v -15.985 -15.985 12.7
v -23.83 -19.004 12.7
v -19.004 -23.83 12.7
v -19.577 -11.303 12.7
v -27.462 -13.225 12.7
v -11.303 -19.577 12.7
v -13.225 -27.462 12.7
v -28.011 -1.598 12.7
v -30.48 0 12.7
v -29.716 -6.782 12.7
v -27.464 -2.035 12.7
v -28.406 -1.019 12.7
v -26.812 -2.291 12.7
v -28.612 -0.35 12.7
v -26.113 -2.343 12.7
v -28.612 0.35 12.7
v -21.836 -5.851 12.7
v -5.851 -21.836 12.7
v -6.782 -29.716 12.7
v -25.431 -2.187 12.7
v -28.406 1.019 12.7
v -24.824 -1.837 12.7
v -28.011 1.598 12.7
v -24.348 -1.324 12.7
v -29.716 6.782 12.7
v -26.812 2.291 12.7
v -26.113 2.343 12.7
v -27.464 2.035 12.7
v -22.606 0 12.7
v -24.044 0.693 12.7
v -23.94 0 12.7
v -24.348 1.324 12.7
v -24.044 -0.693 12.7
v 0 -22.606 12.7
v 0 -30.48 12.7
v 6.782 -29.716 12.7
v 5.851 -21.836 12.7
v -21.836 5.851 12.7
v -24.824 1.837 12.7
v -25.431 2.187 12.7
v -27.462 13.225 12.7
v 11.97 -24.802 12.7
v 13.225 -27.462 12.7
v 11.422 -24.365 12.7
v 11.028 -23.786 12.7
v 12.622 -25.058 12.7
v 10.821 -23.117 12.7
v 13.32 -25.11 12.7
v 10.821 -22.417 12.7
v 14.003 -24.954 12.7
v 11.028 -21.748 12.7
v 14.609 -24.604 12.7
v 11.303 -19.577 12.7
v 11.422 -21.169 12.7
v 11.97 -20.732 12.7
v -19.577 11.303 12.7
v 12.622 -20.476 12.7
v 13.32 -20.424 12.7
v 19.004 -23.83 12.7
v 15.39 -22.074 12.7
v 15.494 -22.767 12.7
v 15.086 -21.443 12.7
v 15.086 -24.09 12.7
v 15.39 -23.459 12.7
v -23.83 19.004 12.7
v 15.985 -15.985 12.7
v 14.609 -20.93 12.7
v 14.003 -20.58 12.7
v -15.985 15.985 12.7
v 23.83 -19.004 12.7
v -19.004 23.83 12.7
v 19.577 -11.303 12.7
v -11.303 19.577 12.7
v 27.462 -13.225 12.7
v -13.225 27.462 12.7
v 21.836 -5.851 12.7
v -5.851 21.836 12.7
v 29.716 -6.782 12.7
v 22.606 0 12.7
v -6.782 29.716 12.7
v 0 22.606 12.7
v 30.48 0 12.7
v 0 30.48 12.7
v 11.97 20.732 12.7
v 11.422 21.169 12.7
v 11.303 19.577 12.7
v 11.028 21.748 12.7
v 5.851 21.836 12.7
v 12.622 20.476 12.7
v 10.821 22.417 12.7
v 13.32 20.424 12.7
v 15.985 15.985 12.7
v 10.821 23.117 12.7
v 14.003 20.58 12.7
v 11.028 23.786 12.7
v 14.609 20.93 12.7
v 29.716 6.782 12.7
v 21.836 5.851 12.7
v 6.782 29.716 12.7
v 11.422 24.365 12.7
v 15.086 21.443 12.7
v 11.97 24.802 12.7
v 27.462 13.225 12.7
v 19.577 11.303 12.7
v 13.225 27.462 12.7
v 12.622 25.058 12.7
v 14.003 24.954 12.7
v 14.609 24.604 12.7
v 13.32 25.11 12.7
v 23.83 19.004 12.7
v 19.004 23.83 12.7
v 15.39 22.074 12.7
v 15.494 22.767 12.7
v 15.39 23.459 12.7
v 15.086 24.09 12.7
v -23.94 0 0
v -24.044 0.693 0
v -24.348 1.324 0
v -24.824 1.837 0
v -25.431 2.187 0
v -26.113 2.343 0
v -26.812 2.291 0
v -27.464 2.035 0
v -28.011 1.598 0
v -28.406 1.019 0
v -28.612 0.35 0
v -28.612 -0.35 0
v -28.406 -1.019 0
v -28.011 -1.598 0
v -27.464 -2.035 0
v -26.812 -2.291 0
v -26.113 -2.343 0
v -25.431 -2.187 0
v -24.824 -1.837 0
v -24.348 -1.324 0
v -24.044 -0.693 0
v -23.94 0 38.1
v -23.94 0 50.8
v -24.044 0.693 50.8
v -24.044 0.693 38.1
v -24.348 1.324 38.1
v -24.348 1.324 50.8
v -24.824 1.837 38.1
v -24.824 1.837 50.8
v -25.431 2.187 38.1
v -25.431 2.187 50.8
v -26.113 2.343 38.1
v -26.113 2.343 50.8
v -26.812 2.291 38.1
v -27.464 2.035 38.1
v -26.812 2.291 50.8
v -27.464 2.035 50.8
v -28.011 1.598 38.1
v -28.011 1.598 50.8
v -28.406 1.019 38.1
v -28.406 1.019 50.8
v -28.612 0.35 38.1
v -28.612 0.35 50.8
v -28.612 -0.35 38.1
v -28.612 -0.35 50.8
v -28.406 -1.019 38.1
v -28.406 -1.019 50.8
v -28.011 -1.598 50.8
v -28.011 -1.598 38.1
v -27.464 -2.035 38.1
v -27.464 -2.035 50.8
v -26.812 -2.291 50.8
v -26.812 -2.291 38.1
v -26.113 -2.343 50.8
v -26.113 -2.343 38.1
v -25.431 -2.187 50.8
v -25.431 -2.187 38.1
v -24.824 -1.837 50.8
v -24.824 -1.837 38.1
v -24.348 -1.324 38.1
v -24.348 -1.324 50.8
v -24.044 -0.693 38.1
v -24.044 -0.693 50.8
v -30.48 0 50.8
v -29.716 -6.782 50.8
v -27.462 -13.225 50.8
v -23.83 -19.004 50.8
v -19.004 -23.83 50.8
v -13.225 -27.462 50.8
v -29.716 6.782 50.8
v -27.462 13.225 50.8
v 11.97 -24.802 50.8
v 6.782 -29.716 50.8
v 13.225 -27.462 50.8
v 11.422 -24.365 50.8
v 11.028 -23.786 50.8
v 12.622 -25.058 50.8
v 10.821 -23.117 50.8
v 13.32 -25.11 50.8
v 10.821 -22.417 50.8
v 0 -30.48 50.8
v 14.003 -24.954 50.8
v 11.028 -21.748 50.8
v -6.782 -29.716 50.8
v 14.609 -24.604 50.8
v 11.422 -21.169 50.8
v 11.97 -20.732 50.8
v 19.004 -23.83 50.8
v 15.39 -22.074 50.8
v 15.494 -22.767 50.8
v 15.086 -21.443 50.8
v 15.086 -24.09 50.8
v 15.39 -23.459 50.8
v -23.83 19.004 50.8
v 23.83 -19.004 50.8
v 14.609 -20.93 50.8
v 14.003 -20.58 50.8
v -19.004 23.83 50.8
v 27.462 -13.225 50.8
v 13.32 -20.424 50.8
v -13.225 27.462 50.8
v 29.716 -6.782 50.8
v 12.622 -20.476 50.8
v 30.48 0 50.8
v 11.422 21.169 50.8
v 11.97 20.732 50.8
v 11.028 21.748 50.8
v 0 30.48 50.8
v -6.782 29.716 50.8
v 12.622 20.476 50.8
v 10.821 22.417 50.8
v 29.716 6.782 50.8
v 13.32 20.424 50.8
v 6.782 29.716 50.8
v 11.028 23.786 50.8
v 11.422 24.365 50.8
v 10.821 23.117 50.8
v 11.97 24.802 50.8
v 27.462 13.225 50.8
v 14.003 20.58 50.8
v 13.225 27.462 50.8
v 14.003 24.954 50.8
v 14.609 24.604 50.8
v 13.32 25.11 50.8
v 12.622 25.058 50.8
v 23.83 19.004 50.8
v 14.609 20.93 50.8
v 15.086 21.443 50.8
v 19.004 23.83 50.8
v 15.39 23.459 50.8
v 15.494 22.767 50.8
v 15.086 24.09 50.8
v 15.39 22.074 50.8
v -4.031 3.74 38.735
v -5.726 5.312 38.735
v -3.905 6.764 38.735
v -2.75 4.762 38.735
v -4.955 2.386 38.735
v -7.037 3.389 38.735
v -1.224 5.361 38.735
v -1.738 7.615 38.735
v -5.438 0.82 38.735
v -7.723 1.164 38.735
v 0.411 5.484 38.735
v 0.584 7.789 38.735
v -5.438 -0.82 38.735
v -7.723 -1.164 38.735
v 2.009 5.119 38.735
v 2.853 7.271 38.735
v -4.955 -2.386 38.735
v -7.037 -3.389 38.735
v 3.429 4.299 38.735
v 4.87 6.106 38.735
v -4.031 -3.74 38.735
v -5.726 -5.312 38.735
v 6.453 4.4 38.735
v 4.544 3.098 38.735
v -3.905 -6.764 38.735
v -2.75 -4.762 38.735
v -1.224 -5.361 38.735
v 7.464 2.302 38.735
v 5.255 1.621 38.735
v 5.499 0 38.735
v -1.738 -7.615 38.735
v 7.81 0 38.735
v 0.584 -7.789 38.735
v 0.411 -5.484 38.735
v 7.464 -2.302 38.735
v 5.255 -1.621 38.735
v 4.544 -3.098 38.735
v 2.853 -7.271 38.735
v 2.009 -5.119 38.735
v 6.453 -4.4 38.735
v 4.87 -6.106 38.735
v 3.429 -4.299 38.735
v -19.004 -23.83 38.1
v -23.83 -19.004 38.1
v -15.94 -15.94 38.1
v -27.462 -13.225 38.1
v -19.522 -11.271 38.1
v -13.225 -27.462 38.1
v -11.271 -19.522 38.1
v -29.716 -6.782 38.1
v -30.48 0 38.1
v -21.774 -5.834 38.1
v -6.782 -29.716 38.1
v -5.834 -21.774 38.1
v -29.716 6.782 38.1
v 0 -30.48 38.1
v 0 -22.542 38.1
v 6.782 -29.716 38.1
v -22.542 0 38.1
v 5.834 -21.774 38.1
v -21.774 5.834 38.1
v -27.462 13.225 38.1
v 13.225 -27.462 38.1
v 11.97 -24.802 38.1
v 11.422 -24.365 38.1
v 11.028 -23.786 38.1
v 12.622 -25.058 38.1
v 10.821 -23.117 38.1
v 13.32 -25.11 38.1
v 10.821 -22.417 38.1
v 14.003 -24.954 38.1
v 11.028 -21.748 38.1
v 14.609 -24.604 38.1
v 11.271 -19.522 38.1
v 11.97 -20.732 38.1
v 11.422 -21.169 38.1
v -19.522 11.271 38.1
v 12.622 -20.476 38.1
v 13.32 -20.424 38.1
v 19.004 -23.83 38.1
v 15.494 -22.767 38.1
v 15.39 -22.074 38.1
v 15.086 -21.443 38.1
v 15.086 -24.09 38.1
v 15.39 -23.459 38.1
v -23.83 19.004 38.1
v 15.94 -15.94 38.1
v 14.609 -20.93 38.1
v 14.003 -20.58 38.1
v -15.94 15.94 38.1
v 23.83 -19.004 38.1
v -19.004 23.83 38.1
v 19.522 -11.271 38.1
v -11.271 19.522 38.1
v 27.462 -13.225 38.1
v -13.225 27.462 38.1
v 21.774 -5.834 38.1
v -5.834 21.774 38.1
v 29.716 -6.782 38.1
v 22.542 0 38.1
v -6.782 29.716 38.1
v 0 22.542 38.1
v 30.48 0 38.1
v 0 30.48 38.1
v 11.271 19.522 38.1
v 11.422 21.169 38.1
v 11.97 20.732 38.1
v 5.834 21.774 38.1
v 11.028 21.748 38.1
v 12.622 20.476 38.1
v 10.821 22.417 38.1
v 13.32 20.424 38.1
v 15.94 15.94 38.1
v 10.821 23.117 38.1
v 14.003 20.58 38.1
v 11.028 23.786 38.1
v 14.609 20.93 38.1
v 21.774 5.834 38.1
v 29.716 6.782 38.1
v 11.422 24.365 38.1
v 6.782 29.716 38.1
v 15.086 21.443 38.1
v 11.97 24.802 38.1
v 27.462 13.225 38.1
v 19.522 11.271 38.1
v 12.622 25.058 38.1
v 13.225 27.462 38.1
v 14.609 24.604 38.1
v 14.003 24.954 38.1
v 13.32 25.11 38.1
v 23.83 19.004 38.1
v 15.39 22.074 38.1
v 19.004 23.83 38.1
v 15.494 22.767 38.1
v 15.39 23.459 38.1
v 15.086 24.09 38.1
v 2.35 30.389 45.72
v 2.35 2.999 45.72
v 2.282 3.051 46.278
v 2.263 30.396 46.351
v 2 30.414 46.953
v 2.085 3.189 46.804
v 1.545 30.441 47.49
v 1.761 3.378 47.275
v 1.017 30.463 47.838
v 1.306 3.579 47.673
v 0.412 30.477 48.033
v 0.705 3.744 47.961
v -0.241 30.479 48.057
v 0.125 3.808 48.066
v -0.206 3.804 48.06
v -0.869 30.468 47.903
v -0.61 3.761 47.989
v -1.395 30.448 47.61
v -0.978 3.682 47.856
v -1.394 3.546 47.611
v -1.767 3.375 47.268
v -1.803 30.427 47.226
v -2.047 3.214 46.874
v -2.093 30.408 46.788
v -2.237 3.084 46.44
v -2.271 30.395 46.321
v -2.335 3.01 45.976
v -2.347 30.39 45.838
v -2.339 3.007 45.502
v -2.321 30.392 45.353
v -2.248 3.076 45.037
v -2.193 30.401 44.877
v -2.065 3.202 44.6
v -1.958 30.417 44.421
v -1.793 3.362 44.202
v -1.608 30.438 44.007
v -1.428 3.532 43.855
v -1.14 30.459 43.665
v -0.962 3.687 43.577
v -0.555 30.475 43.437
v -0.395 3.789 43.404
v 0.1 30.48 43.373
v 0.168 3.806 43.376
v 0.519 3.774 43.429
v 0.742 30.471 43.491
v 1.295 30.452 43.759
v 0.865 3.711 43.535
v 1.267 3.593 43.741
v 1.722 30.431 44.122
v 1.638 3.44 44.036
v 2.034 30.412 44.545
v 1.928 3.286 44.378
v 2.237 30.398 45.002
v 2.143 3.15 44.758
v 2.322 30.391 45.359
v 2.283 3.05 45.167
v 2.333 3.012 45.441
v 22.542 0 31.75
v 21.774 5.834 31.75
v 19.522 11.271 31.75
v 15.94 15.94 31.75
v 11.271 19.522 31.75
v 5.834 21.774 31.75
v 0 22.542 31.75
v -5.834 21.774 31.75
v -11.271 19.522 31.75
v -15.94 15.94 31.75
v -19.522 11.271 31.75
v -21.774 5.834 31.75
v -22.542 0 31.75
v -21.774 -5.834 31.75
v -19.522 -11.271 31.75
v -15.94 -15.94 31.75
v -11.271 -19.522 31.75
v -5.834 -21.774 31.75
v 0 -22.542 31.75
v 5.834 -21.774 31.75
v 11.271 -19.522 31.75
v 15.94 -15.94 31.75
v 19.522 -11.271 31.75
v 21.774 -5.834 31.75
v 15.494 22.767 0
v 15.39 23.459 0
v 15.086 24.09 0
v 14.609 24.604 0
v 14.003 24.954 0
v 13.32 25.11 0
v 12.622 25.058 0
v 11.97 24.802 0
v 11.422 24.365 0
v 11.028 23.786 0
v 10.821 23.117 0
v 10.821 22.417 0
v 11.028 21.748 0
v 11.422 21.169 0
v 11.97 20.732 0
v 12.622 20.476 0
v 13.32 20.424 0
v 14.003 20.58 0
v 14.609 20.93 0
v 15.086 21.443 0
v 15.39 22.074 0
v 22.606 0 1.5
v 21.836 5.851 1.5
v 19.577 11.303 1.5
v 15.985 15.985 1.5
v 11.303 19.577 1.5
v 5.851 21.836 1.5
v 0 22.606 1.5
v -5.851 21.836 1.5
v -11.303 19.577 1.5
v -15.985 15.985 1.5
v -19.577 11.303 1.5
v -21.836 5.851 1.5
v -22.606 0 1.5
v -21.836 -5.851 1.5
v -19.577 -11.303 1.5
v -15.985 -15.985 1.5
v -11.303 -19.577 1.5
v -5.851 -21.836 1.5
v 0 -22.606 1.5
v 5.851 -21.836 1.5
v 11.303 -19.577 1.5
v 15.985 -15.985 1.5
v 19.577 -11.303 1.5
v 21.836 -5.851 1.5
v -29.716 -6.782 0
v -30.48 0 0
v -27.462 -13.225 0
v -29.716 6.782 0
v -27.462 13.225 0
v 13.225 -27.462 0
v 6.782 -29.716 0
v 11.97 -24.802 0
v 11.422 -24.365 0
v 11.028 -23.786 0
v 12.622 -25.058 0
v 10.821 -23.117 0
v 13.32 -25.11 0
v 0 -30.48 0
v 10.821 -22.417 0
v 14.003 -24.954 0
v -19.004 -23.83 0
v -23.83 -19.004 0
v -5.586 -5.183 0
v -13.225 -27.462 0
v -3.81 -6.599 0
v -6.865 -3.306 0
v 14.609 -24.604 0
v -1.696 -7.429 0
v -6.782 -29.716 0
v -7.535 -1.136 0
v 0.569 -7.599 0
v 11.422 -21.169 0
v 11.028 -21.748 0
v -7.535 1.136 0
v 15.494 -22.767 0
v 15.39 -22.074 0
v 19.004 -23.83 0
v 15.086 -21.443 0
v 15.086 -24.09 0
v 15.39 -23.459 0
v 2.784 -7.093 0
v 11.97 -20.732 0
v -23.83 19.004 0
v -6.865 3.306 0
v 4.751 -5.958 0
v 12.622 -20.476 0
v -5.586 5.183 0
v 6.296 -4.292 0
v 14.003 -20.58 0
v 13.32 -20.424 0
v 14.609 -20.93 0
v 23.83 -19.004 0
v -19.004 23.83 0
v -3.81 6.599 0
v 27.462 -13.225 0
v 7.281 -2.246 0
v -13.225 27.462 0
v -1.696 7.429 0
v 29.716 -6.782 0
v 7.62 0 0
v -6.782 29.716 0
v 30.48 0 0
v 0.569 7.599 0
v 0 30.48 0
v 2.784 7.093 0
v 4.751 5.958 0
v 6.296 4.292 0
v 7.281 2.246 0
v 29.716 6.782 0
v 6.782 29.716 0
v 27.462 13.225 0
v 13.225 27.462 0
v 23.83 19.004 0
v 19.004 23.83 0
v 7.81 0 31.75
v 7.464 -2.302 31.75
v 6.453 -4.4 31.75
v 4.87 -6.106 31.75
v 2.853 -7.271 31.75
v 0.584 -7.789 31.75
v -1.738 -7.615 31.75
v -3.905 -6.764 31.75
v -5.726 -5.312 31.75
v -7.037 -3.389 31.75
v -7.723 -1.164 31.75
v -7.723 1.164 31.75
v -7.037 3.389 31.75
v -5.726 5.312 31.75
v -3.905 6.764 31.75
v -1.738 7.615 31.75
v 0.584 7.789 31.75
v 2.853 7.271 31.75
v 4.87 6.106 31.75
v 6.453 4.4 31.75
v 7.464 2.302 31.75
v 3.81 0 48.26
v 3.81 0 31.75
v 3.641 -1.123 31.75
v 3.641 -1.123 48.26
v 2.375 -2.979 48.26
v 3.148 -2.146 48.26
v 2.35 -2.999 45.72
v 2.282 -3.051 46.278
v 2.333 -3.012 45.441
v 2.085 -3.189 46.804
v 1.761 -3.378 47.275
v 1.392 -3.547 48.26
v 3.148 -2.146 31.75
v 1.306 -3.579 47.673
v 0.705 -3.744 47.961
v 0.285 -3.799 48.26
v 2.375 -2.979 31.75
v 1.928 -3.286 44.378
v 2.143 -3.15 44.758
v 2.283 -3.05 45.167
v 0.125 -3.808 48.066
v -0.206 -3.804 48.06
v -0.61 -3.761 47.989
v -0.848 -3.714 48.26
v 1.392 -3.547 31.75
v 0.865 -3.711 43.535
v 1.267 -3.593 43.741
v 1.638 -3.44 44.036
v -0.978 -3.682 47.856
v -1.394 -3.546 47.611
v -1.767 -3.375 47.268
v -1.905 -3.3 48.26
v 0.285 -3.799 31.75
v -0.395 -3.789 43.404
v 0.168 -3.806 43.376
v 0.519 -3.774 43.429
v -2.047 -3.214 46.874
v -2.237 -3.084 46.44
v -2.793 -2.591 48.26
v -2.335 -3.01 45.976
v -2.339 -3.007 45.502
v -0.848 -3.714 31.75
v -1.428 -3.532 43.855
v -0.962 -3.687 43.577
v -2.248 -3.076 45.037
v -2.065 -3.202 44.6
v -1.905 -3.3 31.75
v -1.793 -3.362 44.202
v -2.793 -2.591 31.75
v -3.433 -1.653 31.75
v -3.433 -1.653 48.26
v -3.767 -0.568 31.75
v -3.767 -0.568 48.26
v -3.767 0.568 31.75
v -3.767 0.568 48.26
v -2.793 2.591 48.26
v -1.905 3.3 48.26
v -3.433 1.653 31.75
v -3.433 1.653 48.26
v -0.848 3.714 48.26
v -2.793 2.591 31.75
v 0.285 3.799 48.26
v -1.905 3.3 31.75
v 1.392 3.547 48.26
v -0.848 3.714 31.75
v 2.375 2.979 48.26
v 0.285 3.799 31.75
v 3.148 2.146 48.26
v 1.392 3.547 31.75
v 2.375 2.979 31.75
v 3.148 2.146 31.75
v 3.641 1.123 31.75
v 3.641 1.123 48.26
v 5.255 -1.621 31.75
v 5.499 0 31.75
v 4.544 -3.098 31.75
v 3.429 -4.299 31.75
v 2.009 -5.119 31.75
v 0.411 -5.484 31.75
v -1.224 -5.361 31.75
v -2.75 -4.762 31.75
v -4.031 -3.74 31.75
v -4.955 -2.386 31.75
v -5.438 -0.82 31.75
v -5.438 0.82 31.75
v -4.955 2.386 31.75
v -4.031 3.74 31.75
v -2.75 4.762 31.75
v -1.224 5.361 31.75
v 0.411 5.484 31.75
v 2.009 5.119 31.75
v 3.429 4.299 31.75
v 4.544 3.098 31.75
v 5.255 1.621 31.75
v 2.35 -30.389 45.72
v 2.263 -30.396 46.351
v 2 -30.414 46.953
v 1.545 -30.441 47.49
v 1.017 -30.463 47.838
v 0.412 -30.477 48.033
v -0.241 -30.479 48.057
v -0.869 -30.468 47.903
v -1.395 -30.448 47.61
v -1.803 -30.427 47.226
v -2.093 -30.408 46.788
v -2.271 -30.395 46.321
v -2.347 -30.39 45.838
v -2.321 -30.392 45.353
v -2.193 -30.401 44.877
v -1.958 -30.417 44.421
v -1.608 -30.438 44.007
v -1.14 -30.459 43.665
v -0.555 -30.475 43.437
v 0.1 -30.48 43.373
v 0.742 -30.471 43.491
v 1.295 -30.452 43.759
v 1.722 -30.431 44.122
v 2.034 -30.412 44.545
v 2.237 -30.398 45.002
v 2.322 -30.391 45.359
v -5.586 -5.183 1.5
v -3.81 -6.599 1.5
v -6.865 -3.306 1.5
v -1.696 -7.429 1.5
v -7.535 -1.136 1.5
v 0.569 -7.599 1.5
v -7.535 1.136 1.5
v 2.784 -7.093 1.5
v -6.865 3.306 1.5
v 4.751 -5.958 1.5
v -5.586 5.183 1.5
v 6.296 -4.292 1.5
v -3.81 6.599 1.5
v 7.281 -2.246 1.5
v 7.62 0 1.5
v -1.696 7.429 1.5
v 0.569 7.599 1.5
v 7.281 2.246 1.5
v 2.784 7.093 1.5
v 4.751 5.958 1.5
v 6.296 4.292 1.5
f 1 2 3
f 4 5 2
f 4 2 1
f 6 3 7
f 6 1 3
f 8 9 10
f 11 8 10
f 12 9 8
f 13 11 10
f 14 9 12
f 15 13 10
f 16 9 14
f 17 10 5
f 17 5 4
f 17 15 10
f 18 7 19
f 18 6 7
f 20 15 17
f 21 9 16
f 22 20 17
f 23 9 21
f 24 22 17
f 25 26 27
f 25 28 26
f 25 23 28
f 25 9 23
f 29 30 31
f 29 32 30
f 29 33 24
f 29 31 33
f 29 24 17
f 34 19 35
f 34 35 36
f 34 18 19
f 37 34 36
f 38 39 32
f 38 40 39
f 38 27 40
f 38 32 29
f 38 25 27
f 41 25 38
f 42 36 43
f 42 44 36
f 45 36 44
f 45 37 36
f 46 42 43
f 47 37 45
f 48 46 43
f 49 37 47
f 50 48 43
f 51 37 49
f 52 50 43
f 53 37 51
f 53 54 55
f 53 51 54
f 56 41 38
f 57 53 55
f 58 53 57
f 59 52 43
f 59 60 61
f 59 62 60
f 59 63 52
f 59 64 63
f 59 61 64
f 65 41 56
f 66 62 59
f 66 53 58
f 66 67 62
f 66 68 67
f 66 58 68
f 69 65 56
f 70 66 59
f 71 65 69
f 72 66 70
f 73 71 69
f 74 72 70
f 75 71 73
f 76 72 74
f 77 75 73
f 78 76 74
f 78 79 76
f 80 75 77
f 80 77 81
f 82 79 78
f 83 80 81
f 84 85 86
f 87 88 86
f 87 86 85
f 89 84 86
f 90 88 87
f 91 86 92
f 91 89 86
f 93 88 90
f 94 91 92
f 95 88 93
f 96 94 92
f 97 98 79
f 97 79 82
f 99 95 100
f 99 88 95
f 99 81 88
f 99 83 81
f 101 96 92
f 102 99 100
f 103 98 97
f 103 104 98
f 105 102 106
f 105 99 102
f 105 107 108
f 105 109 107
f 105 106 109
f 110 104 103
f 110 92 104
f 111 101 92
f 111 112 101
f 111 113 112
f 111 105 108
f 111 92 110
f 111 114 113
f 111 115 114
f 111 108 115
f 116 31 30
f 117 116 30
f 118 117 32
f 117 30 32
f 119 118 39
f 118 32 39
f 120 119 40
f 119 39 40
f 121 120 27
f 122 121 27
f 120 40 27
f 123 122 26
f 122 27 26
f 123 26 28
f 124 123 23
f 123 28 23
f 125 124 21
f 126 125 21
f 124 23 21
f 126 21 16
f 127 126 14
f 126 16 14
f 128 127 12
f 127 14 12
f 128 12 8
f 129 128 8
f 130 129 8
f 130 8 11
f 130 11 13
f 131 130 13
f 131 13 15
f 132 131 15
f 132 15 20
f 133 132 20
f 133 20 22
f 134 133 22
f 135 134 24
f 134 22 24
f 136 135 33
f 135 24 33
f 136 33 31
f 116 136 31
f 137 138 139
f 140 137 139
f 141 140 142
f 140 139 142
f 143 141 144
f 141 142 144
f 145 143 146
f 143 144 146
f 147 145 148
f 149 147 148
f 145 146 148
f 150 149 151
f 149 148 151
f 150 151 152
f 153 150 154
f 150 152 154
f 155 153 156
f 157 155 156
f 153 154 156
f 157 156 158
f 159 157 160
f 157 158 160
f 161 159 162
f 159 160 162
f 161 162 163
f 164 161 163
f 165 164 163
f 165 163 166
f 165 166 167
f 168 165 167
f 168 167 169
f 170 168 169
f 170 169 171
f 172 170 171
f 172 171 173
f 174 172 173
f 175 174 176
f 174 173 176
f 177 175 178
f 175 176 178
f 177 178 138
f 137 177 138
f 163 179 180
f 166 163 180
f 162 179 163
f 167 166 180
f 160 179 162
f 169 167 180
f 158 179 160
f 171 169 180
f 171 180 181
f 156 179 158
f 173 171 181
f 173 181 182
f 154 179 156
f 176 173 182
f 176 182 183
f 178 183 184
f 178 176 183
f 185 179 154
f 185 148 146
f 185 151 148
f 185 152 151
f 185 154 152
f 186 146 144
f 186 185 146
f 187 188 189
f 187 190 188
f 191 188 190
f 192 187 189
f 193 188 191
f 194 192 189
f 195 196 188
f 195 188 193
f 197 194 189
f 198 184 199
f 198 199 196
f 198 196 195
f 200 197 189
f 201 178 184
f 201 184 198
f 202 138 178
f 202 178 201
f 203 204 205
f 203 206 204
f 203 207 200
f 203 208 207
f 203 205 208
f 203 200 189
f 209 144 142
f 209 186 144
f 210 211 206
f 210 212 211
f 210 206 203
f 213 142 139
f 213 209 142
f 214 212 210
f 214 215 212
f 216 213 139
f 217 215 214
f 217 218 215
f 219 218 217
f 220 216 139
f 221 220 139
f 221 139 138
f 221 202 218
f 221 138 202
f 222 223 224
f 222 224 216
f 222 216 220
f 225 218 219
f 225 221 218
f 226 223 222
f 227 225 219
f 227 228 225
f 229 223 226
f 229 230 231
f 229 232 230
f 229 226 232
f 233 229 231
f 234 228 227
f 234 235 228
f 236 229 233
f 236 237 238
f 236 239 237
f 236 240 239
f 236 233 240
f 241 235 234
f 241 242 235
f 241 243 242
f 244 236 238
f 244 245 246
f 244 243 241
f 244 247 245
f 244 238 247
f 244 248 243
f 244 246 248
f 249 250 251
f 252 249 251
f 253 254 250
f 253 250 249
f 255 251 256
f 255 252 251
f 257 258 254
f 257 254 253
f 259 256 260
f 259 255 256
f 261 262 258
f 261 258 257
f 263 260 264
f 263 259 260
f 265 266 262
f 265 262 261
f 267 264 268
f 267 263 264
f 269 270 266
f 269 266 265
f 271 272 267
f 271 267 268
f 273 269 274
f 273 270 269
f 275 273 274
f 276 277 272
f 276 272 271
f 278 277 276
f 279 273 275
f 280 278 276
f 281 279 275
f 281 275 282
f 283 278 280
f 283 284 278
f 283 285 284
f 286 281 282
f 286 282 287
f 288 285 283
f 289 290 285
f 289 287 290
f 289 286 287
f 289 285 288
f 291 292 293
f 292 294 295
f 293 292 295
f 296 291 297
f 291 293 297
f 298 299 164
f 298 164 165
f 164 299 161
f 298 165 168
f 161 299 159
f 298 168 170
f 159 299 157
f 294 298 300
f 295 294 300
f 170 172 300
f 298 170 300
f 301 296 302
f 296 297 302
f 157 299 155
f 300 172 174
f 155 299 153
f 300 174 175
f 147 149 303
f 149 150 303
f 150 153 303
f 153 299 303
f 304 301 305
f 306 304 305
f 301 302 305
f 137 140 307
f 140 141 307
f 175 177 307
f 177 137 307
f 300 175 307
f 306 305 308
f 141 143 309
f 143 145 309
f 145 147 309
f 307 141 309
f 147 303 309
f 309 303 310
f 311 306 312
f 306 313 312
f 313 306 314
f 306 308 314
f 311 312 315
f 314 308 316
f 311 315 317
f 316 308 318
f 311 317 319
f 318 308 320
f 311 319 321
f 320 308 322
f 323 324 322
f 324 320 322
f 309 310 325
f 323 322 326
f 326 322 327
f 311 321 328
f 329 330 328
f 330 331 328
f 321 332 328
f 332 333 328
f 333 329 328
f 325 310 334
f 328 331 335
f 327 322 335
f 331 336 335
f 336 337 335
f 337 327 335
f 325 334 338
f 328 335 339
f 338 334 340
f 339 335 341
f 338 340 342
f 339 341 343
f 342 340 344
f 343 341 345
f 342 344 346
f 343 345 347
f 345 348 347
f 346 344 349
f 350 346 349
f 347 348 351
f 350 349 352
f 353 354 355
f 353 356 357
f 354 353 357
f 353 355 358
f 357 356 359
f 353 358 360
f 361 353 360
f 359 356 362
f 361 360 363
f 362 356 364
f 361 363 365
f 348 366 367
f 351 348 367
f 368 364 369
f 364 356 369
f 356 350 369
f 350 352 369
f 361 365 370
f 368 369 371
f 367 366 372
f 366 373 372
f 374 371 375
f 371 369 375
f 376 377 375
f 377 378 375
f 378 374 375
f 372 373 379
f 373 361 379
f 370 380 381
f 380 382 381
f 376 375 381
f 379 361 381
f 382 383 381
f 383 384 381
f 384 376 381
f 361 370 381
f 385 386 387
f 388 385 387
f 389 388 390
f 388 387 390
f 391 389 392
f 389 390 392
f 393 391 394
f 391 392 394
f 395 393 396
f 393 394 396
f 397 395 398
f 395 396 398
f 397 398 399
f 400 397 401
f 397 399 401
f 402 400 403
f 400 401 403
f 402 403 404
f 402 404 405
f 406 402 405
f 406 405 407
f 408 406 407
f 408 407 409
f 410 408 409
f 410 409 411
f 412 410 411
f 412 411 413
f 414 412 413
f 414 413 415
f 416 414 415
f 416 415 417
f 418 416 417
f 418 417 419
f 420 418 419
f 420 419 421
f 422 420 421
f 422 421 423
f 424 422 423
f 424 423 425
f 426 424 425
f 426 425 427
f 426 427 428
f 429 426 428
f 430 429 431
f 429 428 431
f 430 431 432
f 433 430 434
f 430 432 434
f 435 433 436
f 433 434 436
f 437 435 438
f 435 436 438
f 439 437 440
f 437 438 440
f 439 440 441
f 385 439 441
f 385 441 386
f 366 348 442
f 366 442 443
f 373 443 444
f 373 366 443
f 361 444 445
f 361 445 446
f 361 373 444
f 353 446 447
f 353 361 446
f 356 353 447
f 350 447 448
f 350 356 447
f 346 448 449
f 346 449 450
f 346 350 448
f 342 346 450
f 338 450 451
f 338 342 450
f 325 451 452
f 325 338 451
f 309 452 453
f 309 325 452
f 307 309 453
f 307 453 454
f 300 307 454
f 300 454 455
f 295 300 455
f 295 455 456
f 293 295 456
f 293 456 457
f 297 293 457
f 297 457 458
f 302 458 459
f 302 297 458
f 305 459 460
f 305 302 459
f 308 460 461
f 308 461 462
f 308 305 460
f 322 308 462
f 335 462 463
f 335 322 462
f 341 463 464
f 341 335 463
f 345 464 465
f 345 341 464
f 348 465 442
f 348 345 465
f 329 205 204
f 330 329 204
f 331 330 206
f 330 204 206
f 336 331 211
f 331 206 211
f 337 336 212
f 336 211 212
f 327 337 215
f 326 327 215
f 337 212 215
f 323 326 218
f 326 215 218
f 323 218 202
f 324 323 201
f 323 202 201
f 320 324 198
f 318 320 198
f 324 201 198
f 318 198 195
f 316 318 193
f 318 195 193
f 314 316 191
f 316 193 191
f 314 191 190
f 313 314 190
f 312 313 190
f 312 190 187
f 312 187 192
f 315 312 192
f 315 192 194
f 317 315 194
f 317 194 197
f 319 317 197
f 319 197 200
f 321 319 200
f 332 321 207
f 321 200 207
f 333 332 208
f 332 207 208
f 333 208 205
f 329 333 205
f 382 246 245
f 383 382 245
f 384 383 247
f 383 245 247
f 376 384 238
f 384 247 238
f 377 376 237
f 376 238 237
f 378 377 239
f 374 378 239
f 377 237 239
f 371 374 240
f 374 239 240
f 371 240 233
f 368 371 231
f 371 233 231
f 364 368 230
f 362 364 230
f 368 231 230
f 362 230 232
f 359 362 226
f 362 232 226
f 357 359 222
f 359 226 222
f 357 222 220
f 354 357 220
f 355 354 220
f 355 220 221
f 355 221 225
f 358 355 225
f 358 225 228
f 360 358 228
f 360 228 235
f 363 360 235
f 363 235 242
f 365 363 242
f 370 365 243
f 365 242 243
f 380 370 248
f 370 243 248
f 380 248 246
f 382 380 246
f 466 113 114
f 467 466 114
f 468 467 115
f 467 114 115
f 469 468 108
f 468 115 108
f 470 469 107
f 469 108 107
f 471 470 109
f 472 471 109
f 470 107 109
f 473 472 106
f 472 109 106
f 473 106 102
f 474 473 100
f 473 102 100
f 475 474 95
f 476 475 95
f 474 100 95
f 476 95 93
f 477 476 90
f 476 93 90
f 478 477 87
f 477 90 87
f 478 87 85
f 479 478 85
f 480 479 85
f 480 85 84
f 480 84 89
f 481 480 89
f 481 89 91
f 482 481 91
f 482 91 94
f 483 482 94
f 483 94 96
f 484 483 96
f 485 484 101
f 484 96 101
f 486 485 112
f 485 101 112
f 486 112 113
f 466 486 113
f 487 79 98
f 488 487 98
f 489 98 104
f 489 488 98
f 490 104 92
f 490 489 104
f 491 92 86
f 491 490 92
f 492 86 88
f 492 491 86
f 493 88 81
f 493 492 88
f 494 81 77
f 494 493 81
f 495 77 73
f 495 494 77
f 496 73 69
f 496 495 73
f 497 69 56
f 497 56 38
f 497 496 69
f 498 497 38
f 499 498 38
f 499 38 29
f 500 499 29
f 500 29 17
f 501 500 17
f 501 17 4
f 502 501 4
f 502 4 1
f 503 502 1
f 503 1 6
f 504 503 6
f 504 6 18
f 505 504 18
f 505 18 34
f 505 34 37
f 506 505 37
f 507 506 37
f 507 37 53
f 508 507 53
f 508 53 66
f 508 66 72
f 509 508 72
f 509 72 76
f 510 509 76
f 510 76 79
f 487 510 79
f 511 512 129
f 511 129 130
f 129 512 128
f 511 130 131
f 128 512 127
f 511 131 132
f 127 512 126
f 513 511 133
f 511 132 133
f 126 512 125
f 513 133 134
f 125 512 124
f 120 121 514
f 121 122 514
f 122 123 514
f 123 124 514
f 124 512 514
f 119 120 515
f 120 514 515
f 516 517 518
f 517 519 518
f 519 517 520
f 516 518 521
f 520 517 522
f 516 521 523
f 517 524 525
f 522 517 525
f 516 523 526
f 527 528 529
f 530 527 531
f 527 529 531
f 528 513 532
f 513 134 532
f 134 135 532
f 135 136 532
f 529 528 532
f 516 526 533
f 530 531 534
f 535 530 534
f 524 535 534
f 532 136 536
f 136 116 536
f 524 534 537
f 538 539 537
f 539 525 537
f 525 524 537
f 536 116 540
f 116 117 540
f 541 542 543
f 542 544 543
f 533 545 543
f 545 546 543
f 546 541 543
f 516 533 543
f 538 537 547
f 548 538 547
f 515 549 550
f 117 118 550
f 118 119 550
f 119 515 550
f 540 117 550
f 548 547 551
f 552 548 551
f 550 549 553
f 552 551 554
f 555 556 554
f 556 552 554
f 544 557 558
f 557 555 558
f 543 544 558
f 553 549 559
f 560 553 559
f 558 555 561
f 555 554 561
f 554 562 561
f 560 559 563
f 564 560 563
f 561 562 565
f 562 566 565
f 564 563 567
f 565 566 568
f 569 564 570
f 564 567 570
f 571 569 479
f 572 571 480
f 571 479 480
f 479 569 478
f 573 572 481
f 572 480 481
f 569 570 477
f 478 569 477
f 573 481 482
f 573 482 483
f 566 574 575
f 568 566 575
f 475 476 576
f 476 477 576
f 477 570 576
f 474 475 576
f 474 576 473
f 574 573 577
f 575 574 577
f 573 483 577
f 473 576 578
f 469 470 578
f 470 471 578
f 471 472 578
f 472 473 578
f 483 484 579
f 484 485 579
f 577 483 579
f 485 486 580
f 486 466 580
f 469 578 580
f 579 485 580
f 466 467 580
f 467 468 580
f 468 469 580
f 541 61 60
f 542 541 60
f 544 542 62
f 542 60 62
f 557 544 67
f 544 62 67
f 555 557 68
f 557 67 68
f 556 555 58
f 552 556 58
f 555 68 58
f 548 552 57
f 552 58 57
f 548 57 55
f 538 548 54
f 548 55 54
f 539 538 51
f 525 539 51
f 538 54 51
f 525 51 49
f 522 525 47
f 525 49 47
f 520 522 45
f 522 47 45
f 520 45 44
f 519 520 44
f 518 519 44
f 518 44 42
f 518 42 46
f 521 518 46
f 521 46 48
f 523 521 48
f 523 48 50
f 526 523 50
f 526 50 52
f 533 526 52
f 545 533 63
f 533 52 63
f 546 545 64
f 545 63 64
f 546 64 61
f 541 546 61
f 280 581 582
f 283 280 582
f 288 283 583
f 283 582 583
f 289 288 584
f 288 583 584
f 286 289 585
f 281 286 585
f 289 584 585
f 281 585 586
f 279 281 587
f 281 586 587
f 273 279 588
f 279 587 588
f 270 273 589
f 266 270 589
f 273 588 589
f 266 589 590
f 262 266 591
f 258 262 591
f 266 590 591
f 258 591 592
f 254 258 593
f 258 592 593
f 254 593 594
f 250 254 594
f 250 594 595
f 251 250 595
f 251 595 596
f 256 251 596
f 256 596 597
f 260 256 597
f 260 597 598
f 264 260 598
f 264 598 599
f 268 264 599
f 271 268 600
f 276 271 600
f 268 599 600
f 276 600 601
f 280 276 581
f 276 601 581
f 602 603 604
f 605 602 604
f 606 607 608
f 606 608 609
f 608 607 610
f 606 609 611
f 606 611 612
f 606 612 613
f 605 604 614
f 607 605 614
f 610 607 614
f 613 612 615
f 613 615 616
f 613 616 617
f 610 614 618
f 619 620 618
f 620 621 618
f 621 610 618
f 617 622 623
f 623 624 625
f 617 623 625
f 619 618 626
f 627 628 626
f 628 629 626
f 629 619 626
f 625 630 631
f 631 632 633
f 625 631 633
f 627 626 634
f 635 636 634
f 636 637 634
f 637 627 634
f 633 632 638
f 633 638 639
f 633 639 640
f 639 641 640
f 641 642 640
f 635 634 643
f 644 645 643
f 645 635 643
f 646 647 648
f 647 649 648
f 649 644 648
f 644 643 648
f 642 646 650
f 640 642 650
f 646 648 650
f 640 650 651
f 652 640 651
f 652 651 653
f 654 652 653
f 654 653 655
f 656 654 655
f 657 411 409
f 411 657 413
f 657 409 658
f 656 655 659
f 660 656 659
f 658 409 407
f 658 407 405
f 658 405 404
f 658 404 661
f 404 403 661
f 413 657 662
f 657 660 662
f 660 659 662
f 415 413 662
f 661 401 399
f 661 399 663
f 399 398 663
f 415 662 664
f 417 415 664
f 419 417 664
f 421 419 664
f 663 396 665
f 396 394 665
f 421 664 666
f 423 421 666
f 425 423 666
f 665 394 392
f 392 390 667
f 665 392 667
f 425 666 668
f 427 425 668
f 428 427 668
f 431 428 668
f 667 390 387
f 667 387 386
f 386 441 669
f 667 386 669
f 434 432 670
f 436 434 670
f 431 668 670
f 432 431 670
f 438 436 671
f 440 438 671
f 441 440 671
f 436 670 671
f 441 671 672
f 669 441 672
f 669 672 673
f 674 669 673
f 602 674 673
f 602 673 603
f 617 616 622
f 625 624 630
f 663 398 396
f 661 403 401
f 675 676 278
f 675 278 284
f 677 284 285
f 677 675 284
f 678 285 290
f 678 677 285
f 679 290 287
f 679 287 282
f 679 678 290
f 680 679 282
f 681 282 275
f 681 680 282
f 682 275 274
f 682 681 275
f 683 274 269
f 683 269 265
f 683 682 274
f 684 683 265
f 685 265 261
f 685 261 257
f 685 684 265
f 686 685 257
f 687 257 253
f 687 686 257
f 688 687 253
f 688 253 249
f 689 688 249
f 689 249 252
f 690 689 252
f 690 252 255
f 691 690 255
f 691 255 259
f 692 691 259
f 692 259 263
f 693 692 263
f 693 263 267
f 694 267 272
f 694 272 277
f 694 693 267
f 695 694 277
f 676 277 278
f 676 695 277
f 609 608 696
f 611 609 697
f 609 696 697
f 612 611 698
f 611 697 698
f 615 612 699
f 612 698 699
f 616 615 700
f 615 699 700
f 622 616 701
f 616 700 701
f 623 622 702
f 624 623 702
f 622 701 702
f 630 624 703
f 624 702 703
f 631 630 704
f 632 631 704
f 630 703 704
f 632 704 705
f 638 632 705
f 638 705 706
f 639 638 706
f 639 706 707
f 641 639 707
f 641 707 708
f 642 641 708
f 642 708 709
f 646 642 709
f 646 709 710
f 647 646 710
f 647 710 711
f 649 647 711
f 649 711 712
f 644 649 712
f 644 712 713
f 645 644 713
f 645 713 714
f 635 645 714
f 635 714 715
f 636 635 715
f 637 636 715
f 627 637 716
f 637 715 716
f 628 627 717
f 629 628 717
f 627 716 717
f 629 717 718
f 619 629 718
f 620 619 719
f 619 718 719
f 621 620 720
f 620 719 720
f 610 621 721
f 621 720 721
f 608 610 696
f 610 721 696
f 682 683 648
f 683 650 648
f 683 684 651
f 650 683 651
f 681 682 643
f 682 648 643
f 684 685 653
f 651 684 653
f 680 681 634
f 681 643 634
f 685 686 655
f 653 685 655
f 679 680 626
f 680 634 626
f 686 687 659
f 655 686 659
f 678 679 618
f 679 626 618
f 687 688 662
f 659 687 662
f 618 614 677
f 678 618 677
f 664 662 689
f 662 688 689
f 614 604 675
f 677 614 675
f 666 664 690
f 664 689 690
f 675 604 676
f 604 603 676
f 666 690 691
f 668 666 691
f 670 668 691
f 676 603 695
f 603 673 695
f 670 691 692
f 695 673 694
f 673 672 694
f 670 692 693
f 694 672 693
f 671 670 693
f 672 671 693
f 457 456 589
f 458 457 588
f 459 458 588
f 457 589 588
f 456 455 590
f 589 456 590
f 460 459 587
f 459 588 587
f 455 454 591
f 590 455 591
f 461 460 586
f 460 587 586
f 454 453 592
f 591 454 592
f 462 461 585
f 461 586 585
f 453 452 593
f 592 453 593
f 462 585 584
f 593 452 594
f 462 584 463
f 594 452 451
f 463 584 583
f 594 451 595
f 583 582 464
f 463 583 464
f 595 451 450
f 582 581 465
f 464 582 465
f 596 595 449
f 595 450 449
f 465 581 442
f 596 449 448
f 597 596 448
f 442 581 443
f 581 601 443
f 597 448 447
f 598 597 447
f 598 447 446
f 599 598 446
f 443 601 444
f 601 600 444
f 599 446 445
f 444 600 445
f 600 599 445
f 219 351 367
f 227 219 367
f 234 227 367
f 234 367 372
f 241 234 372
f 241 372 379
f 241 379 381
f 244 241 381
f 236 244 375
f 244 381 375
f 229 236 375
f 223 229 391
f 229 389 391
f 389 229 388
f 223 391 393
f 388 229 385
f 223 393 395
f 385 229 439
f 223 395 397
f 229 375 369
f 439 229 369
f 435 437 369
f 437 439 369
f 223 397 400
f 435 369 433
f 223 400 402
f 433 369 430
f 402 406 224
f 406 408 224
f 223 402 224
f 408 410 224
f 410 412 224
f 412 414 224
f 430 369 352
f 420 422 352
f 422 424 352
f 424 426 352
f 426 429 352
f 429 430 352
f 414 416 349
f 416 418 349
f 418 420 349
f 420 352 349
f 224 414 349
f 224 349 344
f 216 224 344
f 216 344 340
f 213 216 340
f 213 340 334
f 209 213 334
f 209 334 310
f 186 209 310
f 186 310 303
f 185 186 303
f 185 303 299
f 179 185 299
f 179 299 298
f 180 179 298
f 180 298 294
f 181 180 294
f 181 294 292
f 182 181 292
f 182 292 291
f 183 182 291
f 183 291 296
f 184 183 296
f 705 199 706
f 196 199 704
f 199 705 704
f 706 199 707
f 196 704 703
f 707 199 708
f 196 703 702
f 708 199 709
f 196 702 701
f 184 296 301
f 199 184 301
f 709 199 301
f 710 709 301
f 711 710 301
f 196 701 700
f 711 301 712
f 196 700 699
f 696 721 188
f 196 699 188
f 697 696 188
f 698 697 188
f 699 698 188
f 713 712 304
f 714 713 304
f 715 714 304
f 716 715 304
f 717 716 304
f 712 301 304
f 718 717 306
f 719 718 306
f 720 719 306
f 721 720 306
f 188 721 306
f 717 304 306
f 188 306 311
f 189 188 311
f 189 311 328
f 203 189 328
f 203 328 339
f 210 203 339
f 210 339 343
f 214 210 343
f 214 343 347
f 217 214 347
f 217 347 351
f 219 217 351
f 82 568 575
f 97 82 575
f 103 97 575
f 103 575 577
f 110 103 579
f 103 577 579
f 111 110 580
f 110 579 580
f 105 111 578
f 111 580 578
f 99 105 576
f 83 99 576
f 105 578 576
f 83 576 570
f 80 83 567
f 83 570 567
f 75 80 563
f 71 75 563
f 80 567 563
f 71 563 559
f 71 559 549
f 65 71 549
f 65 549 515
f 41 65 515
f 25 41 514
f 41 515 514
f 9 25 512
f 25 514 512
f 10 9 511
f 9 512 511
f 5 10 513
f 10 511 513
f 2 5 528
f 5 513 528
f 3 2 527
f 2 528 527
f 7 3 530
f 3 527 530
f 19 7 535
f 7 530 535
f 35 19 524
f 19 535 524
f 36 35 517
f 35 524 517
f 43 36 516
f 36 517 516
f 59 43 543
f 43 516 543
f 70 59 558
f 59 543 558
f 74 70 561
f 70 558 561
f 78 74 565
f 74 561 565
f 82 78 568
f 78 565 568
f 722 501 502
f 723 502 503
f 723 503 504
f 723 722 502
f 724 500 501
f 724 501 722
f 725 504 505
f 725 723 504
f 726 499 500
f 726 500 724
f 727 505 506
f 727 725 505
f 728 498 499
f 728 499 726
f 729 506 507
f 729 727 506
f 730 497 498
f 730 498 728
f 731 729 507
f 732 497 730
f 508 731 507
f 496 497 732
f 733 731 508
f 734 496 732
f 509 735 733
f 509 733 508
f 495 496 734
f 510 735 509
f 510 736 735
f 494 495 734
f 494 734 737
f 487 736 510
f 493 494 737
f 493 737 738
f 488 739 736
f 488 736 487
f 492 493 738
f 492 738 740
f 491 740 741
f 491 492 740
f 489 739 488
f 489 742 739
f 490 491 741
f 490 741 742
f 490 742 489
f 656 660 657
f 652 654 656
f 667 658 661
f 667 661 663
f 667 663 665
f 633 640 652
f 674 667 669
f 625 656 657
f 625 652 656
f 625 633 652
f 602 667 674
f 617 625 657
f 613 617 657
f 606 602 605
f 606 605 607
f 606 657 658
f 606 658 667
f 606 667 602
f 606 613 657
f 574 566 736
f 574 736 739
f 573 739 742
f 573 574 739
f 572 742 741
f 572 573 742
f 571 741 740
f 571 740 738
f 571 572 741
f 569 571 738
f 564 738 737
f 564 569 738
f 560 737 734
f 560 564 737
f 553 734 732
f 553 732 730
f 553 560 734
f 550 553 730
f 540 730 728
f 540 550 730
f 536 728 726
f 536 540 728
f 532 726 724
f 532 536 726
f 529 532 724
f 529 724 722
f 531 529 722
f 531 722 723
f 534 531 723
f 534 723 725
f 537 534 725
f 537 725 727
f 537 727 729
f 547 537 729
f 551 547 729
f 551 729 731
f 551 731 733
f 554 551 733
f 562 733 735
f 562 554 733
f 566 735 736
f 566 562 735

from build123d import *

# Parameters (mm, degrees)
F0_R      = 22.606
F0_R_2    = 7.62
F1_DEPTH  = 1.5
F0_R_3    = 30.48
F2_DEPTH  = 12.7
F3_R      = 2.3495
F4_DEPTH  = 12.7
F6_R      = 22.5425
F7_DEPTH  = 6.35
F6_R_2    = 30.48
F8_DEPTH  = 12.7
F9_R      = 2.3495
F10_DEPTH = 12.7
F11_R     = 7.8105
F11_R_2   = 5.4991
F12_DEPTH = 6.985
F11_R_3   = 3.81
F13_DEPTH = 16.51
F15_R     = 2.3495
F16_DEPTH = 68.581


with BuildPart() as f1:
    # F0 (on Top) → F1 (new body)
    with BuildSketch(Plane.XY):
        Circle(F0_R)
        Circle(F0_R_2, mode=Mode.SUBTRACT)
    extrude(amount=F1_DEPTH)

    # F0 (on Top) → F2 (join)
    with BuildSketch(Plane.XY):
        Circle(F0_R_3)
        Circle(F0_R, mode=Mode.SUBTRACT)
    extrude(amount=F2_DEPTH)

    # F3 (on face) → F4 (cut, through all)
    with BuildSketch(Plane.XY.offset(12.7)):
        with Locations((-26.289, 0)):
            Circle(F3_R)
        with Locations((13.1445, 22.7669418401)):
            Circle(F3_R)
        with Locations((13.1445, -22.7669418401)):
            Circle(F3_R)
    extrude(amount=-F4_DEPTH, mode=Mode.SUBTRACT)


with BuildPart() as f7:
    # F6 (on offset) → F7 (new body)
    with BuildSketch(Plane.XY.offset(38.1)):
        Circle(F6_R)
    extrude(amount=-F7_DEPTH)

    # F6 (on offset) → F8 (join)
    with BuildSketch(Plane.XY.offset(38.1)):
        Circle(F6_R_2)
        Circle(F6_R, mode=Mode.SUBTRACT)
        Circle(F6_R)
    extrude(amount=F8_DEPTH)

    # F9 (on face) → F10 (cut, through all)
    with BuildSketch(Plane.XY.offset(50.8)):
        with Locations((13.1445, 22.7669418401)):
            Circle(F9_R)
        with Locations((-26.289, 0)):
            Circle(F9_R)
        with Locations((13.1445, -22.7669418401)):
            Circle(F9_R)
    extrude(amount=-F10_DEPTH, mode=Mode.SUBTRACT)

    # F11 (on face) → F12 (cut)
    with BuildSketch(Plane(origin=(0, 0, 31.75), x_dir=(1, 0, 0), z_dir=(0, 0, -1))):
        Circle(F11_R)
        Circle(F11_R_2, mode=Mode.SUBTRACT)
    extrude(amount=-F12_DEPTH, mode=Mode.SUBTRACT)

    # F11 (on face) → F13 (cut)
    with BuildSketch(Plane(origin=(0, 0, 31.75), x_dir=(1, 0, 0), z_dir=(0, 0, -1))):
        Circle(F11_R_3)
    extrude(amount=-F13_DEPTH, mode=Mode.SUBTRACT)

    # F15 (on offset) → F16 (cut, through all)
    with BuildSketch(Plane.XZ.offset(38.1)):
        with Locations((0, 45.72)):
            Circle(F15_R)
    extrude(amount=-F16_DEPTH, mode=Mode.SUBTRACT)


solid = Compound([f1.part, f7.part])
